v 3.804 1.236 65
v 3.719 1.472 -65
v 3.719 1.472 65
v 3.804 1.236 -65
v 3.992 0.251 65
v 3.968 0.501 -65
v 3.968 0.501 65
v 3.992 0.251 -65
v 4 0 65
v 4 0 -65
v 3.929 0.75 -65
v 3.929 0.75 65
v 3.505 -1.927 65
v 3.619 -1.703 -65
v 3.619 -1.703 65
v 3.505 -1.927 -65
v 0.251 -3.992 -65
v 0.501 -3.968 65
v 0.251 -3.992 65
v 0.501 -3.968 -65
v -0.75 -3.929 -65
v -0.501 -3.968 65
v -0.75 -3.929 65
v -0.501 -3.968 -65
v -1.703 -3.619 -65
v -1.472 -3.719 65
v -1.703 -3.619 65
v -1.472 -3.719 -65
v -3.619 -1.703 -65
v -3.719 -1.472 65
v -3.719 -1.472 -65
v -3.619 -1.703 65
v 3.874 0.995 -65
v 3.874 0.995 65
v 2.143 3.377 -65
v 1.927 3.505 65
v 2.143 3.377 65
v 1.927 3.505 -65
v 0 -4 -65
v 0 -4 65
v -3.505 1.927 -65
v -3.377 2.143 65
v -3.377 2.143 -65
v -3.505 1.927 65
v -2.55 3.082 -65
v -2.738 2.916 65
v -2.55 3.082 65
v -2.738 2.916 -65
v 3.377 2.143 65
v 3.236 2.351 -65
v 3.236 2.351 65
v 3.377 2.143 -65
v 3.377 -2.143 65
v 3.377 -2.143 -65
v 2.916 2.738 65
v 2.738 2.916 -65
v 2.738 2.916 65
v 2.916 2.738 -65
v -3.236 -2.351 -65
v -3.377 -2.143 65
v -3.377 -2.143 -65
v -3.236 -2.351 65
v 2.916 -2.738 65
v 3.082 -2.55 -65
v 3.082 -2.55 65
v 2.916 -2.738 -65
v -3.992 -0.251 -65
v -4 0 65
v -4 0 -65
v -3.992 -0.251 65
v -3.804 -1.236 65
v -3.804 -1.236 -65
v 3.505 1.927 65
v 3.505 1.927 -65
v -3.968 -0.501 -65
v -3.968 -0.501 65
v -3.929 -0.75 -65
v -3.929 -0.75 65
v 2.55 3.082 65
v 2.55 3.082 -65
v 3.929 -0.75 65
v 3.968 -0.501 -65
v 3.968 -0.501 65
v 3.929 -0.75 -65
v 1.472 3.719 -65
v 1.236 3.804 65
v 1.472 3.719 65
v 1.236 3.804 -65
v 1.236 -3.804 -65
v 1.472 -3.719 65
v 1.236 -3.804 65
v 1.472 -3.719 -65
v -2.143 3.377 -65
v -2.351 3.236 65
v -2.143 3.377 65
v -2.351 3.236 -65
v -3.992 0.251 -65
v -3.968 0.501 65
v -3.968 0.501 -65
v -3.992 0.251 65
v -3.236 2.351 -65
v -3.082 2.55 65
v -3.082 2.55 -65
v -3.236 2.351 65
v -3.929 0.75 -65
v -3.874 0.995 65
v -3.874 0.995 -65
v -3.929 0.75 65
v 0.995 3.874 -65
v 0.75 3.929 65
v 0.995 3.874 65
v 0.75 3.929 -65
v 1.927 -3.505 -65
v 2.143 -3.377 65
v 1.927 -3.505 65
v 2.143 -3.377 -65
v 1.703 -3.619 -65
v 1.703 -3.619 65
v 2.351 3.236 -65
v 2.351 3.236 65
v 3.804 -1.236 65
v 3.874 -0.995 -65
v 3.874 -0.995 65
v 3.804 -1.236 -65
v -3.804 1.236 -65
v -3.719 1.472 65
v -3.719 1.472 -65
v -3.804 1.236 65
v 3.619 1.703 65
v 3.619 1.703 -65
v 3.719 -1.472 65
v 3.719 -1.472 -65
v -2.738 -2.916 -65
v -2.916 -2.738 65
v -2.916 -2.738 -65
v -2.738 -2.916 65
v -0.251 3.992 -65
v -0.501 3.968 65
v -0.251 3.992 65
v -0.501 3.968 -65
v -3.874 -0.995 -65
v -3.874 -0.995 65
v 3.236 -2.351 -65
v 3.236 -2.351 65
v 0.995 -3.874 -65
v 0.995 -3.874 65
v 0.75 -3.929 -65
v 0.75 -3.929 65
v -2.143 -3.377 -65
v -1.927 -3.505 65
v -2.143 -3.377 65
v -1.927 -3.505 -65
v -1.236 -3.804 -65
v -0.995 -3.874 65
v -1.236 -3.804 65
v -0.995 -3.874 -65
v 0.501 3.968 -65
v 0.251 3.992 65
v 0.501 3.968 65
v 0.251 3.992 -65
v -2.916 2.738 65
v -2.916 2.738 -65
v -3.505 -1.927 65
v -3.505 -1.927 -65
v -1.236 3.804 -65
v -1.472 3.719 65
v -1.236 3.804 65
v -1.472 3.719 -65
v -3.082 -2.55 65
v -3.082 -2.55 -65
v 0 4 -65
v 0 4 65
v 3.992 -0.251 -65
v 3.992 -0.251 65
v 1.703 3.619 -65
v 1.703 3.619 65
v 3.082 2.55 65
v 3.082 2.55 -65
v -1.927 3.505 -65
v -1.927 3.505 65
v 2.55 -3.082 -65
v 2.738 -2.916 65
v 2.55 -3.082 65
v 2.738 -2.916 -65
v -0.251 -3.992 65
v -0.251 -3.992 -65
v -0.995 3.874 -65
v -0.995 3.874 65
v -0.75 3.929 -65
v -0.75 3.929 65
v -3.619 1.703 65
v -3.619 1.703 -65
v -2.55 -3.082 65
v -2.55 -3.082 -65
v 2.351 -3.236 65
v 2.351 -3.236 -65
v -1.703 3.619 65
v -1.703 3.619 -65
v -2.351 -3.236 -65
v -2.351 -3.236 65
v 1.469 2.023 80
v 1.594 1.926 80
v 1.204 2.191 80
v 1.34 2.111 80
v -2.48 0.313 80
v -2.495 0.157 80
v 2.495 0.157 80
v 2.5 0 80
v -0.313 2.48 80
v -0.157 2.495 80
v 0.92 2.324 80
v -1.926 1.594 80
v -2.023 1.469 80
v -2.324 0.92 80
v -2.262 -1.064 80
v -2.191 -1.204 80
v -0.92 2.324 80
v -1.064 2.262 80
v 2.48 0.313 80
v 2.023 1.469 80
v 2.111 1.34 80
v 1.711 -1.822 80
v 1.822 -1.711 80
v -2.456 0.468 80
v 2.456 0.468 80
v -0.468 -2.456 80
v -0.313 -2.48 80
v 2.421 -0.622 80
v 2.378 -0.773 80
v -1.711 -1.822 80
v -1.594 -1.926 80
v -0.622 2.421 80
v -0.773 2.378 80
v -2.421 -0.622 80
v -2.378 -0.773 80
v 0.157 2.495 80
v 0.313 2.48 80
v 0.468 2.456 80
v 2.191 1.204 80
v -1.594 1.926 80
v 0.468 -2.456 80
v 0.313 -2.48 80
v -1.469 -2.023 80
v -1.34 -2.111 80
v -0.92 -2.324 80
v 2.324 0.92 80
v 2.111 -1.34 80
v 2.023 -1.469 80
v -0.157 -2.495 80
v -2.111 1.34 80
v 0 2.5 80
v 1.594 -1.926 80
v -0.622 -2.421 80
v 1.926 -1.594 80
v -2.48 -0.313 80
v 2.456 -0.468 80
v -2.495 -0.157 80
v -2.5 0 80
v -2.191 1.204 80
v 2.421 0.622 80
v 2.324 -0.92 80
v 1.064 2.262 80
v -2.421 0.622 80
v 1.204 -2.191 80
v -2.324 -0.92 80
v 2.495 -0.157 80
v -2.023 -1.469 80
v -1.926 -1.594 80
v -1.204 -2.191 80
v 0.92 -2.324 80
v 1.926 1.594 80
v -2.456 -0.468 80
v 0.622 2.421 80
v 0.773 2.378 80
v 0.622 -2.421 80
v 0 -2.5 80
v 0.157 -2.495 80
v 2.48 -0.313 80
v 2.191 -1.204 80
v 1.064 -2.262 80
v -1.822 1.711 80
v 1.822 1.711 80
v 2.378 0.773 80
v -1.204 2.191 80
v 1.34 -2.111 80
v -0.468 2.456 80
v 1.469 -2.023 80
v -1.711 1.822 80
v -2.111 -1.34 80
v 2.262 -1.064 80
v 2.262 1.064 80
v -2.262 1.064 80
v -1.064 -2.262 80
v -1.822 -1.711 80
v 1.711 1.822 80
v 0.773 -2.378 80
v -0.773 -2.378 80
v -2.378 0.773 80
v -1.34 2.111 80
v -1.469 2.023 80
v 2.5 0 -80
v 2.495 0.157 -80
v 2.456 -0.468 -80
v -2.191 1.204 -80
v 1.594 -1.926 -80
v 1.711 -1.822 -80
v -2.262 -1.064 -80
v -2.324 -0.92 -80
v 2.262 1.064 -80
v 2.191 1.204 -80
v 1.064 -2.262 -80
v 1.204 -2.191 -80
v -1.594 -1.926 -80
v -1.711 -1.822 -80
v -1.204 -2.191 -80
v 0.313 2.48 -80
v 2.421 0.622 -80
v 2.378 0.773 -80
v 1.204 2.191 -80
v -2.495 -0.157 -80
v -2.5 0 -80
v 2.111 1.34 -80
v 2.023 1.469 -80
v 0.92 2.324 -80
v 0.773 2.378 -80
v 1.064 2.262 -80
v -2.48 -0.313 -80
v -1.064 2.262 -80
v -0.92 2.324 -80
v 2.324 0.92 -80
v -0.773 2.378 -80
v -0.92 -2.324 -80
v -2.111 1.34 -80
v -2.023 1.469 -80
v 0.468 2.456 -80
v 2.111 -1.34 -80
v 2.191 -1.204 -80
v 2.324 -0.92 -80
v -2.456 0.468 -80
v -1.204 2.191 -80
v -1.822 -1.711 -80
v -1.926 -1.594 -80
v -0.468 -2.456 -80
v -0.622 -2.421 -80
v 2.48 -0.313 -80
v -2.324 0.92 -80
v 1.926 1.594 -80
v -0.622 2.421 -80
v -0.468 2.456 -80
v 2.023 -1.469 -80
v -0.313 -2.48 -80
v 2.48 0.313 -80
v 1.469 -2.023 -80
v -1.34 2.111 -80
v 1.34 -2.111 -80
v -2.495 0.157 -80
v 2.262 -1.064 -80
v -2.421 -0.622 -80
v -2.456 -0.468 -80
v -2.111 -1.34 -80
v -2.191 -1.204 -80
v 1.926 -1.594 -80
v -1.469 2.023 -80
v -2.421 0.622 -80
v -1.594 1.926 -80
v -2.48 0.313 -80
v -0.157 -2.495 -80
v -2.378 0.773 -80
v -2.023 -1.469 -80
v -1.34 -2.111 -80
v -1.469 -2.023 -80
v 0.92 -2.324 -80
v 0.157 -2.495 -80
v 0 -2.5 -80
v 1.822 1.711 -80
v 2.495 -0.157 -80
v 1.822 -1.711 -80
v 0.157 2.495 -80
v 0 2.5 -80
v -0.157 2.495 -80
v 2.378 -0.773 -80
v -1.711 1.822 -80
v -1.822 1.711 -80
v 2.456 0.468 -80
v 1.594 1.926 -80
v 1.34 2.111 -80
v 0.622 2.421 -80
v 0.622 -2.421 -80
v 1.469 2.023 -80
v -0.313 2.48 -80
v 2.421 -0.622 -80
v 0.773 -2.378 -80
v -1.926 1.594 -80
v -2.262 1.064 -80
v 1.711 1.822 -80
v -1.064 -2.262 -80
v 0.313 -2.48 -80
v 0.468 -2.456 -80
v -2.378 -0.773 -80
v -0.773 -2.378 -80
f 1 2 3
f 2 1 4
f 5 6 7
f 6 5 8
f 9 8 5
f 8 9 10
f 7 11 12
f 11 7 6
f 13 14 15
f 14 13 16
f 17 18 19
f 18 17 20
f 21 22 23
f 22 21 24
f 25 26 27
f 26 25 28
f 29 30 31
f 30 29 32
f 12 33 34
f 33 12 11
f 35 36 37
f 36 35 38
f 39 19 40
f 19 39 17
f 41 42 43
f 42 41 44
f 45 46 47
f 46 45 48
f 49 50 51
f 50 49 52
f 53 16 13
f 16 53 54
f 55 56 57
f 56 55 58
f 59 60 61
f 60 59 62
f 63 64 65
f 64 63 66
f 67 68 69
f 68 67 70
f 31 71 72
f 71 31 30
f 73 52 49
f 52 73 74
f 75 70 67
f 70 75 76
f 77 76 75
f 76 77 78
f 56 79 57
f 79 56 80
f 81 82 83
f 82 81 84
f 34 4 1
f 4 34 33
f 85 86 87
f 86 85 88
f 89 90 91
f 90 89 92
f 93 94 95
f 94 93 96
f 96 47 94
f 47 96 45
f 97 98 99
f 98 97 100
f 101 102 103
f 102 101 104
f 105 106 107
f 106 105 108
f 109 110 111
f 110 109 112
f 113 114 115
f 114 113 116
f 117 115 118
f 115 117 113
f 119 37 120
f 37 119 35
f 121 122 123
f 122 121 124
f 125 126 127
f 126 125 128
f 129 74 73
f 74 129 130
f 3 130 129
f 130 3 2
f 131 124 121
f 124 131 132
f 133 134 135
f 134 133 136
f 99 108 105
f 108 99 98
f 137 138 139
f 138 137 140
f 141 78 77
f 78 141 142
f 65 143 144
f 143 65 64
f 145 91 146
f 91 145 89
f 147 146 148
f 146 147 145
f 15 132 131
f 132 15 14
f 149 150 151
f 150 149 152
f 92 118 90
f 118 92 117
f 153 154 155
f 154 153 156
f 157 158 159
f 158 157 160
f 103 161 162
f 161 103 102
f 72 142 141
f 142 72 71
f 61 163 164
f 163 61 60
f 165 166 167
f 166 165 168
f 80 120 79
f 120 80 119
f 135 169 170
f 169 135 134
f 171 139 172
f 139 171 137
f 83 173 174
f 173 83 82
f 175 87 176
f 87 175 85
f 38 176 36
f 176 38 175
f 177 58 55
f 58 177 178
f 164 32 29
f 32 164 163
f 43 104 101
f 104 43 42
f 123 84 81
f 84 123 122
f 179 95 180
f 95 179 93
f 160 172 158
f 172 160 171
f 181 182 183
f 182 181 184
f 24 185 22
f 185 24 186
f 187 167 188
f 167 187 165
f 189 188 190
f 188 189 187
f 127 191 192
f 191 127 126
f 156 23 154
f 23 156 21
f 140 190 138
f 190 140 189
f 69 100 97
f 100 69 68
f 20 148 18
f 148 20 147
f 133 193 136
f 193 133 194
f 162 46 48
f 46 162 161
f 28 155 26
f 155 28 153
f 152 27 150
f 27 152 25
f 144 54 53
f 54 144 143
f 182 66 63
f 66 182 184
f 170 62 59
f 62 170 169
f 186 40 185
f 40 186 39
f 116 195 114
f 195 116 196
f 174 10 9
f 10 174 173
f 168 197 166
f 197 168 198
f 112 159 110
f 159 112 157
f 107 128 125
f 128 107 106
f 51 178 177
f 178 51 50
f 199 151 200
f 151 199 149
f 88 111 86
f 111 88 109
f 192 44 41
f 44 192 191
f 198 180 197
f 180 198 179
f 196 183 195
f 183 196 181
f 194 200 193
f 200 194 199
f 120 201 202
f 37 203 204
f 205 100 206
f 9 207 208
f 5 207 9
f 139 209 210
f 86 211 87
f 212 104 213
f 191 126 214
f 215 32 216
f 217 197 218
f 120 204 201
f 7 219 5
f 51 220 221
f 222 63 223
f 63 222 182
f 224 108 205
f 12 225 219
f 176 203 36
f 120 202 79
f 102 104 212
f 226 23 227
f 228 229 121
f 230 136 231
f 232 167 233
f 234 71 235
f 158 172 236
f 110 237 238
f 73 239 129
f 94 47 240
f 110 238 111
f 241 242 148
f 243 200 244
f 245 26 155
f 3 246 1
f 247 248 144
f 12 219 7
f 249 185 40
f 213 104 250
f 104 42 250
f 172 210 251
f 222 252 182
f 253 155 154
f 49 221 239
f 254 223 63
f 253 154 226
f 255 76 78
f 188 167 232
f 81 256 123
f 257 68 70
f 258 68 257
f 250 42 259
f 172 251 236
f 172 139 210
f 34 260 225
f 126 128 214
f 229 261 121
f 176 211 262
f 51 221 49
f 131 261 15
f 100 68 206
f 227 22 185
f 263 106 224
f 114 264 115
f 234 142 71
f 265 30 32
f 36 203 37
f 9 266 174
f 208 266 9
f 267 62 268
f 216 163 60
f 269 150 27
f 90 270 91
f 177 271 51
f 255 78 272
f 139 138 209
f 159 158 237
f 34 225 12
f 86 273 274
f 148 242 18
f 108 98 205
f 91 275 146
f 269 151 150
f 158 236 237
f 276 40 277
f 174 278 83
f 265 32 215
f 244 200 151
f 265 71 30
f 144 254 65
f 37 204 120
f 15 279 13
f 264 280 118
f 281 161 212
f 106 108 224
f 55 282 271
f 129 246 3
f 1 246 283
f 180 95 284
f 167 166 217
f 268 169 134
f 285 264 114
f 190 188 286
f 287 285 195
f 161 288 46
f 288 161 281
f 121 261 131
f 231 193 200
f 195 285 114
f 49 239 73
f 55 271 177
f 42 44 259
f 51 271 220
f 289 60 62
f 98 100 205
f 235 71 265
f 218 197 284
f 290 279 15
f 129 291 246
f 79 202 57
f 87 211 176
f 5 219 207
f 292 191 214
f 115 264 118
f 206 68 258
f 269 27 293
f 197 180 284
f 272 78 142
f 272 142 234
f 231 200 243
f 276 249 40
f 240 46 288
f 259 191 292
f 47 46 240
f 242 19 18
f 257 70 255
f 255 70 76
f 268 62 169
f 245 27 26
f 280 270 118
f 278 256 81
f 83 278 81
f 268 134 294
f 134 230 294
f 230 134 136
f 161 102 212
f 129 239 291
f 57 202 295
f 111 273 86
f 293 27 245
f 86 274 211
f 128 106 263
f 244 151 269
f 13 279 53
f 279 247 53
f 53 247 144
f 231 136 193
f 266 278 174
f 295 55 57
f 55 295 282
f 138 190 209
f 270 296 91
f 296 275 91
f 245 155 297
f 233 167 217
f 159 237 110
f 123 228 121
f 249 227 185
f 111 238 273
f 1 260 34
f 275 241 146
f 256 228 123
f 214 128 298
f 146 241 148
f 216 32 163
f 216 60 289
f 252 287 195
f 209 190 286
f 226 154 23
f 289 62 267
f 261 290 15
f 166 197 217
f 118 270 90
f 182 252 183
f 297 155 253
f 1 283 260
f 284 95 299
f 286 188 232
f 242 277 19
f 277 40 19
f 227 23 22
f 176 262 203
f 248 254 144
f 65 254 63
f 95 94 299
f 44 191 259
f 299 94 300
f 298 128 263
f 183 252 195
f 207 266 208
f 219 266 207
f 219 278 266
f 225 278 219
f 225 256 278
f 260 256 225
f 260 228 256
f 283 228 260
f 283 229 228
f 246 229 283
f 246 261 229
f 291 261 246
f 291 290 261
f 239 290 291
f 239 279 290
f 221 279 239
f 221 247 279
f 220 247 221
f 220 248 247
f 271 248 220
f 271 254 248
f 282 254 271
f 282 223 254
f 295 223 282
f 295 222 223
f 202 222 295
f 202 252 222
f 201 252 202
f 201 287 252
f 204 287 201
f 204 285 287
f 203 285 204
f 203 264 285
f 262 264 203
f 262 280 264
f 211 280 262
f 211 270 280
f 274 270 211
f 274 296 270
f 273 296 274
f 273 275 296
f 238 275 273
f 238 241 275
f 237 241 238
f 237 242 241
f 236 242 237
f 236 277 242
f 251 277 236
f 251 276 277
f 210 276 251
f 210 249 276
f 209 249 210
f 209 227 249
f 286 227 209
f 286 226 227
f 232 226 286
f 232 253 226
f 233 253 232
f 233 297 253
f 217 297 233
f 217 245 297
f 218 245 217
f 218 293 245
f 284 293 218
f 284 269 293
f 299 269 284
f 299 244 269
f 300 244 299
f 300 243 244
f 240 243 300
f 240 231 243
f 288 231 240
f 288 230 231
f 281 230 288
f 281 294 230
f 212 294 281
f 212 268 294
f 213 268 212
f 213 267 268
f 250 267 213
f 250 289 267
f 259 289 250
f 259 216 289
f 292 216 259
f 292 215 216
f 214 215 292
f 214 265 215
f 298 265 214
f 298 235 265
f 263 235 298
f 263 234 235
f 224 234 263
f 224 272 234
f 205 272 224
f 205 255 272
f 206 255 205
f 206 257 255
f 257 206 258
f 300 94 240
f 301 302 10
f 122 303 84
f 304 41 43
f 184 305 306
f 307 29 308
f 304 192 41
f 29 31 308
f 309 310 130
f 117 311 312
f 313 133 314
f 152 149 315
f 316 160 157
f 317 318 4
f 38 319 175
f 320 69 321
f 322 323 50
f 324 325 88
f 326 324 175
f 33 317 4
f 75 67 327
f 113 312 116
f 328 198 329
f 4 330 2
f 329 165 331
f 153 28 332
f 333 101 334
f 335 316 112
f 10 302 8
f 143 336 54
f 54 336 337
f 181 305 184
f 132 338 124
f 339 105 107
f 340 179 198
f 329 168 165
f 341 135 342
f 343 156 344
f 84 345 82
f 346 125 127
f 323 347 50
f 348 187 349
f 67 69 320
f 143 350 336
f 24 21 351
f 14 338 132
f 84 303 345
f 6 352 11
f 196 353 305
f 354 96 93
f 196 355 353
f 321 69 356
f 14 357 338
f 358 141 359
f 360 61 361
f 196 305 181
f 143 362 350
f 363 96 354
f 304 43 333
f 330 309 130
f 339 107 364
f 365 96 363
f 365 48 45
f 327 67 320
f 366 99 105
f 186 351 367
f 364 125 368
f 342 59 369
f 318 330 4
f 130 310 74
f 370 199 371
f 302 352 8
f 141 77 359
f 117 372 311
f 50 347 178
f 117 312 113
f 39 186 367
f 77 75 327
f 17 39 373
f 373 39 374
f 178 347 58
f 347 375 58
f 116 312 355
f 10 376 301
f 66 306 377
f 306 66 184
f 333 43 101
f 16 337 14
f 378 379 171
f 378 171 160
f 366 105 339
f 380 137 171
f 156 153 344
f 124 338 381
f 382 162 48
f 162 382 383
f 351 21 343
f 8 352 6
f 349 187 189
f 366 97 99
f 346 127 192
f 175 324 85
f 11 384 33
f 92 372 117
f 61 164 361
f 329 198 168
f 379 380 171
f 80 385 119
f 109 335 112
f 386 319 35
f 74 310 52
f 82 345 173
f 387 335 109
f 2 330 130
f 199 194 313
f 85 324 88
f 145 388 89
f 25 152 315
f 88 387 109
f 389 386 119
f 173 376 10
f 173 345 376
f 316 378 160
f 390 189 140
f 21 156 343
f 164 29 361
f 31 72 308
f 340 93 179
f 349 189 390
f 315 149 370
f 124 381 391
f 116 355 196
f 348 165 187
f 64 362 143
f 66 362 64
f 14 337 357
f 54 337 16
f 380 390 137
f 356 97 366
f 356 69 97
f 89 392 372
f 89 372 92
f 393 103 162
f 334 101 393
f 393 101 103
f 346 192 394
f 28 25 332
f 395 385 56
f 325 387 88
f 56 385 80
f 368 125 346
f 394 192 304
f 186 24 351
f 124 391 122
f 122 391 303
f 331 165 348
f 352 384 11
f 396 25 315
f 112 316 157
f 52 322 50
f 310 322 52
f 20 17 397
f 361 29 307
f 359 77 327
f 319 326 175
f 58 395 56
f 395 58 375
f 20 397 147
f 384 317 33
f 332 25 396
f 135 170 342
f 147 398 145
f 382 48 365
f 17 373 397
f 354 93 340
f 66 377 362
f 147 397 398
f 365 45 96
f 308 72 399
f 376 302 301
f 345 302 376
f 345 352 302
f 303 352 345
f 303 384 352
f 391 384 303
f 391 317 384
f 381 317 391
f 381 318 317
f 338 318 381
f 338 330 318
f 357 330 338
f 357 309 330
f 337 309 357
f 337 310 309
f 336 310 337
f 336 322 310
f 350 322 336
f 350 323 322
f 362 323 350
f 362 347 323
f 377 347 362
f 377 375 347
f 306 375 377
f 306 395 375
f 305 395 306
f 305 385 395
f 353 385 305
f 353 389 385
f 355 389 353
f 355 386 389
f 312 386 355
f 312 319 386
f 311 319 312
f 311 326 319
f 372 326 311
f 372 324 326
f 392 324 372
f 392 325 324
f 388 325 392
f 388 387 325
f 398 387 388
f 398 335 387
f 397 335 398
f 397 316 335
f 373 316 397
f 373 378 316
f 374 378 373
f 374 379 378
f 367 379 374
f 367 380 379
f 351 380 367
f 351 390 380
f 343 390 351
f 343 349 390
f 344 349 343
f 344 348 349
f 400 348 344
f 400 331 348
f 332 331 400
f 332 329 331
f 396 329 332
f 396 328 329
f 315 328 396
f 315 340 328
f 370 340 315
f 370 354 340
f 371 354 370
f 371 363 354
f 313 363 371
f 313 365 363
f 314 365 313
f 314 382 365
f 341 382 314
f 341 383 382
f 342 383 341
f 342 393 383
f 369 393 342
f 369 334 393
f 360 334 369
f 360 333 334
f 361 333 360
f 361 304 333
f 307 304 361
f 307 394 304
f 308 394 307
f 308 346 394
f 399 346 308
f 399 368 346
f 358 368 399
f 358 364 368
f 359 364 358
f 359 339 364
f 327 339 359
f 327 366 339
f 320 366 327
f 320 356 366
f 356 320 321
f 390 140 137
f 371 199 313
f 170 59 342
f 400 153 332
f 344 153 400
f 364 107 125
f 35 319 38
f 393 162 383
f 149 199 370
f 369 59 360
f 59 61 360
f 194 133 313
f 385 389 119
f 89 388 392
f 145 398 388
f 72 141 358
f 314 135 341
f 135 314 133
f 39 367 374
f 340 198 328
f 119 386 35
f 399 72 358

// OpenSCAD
l=130;
r=4;

$fn=100;

union(){
union(){
union(){
cylinder(l,r,r,center=true);
translate([0,0,72.5])cylinder(15,4,2.5,center=true);
translate([0,0,-72.5])cylinder(15,2.5,4,center=true);
}
}
}
